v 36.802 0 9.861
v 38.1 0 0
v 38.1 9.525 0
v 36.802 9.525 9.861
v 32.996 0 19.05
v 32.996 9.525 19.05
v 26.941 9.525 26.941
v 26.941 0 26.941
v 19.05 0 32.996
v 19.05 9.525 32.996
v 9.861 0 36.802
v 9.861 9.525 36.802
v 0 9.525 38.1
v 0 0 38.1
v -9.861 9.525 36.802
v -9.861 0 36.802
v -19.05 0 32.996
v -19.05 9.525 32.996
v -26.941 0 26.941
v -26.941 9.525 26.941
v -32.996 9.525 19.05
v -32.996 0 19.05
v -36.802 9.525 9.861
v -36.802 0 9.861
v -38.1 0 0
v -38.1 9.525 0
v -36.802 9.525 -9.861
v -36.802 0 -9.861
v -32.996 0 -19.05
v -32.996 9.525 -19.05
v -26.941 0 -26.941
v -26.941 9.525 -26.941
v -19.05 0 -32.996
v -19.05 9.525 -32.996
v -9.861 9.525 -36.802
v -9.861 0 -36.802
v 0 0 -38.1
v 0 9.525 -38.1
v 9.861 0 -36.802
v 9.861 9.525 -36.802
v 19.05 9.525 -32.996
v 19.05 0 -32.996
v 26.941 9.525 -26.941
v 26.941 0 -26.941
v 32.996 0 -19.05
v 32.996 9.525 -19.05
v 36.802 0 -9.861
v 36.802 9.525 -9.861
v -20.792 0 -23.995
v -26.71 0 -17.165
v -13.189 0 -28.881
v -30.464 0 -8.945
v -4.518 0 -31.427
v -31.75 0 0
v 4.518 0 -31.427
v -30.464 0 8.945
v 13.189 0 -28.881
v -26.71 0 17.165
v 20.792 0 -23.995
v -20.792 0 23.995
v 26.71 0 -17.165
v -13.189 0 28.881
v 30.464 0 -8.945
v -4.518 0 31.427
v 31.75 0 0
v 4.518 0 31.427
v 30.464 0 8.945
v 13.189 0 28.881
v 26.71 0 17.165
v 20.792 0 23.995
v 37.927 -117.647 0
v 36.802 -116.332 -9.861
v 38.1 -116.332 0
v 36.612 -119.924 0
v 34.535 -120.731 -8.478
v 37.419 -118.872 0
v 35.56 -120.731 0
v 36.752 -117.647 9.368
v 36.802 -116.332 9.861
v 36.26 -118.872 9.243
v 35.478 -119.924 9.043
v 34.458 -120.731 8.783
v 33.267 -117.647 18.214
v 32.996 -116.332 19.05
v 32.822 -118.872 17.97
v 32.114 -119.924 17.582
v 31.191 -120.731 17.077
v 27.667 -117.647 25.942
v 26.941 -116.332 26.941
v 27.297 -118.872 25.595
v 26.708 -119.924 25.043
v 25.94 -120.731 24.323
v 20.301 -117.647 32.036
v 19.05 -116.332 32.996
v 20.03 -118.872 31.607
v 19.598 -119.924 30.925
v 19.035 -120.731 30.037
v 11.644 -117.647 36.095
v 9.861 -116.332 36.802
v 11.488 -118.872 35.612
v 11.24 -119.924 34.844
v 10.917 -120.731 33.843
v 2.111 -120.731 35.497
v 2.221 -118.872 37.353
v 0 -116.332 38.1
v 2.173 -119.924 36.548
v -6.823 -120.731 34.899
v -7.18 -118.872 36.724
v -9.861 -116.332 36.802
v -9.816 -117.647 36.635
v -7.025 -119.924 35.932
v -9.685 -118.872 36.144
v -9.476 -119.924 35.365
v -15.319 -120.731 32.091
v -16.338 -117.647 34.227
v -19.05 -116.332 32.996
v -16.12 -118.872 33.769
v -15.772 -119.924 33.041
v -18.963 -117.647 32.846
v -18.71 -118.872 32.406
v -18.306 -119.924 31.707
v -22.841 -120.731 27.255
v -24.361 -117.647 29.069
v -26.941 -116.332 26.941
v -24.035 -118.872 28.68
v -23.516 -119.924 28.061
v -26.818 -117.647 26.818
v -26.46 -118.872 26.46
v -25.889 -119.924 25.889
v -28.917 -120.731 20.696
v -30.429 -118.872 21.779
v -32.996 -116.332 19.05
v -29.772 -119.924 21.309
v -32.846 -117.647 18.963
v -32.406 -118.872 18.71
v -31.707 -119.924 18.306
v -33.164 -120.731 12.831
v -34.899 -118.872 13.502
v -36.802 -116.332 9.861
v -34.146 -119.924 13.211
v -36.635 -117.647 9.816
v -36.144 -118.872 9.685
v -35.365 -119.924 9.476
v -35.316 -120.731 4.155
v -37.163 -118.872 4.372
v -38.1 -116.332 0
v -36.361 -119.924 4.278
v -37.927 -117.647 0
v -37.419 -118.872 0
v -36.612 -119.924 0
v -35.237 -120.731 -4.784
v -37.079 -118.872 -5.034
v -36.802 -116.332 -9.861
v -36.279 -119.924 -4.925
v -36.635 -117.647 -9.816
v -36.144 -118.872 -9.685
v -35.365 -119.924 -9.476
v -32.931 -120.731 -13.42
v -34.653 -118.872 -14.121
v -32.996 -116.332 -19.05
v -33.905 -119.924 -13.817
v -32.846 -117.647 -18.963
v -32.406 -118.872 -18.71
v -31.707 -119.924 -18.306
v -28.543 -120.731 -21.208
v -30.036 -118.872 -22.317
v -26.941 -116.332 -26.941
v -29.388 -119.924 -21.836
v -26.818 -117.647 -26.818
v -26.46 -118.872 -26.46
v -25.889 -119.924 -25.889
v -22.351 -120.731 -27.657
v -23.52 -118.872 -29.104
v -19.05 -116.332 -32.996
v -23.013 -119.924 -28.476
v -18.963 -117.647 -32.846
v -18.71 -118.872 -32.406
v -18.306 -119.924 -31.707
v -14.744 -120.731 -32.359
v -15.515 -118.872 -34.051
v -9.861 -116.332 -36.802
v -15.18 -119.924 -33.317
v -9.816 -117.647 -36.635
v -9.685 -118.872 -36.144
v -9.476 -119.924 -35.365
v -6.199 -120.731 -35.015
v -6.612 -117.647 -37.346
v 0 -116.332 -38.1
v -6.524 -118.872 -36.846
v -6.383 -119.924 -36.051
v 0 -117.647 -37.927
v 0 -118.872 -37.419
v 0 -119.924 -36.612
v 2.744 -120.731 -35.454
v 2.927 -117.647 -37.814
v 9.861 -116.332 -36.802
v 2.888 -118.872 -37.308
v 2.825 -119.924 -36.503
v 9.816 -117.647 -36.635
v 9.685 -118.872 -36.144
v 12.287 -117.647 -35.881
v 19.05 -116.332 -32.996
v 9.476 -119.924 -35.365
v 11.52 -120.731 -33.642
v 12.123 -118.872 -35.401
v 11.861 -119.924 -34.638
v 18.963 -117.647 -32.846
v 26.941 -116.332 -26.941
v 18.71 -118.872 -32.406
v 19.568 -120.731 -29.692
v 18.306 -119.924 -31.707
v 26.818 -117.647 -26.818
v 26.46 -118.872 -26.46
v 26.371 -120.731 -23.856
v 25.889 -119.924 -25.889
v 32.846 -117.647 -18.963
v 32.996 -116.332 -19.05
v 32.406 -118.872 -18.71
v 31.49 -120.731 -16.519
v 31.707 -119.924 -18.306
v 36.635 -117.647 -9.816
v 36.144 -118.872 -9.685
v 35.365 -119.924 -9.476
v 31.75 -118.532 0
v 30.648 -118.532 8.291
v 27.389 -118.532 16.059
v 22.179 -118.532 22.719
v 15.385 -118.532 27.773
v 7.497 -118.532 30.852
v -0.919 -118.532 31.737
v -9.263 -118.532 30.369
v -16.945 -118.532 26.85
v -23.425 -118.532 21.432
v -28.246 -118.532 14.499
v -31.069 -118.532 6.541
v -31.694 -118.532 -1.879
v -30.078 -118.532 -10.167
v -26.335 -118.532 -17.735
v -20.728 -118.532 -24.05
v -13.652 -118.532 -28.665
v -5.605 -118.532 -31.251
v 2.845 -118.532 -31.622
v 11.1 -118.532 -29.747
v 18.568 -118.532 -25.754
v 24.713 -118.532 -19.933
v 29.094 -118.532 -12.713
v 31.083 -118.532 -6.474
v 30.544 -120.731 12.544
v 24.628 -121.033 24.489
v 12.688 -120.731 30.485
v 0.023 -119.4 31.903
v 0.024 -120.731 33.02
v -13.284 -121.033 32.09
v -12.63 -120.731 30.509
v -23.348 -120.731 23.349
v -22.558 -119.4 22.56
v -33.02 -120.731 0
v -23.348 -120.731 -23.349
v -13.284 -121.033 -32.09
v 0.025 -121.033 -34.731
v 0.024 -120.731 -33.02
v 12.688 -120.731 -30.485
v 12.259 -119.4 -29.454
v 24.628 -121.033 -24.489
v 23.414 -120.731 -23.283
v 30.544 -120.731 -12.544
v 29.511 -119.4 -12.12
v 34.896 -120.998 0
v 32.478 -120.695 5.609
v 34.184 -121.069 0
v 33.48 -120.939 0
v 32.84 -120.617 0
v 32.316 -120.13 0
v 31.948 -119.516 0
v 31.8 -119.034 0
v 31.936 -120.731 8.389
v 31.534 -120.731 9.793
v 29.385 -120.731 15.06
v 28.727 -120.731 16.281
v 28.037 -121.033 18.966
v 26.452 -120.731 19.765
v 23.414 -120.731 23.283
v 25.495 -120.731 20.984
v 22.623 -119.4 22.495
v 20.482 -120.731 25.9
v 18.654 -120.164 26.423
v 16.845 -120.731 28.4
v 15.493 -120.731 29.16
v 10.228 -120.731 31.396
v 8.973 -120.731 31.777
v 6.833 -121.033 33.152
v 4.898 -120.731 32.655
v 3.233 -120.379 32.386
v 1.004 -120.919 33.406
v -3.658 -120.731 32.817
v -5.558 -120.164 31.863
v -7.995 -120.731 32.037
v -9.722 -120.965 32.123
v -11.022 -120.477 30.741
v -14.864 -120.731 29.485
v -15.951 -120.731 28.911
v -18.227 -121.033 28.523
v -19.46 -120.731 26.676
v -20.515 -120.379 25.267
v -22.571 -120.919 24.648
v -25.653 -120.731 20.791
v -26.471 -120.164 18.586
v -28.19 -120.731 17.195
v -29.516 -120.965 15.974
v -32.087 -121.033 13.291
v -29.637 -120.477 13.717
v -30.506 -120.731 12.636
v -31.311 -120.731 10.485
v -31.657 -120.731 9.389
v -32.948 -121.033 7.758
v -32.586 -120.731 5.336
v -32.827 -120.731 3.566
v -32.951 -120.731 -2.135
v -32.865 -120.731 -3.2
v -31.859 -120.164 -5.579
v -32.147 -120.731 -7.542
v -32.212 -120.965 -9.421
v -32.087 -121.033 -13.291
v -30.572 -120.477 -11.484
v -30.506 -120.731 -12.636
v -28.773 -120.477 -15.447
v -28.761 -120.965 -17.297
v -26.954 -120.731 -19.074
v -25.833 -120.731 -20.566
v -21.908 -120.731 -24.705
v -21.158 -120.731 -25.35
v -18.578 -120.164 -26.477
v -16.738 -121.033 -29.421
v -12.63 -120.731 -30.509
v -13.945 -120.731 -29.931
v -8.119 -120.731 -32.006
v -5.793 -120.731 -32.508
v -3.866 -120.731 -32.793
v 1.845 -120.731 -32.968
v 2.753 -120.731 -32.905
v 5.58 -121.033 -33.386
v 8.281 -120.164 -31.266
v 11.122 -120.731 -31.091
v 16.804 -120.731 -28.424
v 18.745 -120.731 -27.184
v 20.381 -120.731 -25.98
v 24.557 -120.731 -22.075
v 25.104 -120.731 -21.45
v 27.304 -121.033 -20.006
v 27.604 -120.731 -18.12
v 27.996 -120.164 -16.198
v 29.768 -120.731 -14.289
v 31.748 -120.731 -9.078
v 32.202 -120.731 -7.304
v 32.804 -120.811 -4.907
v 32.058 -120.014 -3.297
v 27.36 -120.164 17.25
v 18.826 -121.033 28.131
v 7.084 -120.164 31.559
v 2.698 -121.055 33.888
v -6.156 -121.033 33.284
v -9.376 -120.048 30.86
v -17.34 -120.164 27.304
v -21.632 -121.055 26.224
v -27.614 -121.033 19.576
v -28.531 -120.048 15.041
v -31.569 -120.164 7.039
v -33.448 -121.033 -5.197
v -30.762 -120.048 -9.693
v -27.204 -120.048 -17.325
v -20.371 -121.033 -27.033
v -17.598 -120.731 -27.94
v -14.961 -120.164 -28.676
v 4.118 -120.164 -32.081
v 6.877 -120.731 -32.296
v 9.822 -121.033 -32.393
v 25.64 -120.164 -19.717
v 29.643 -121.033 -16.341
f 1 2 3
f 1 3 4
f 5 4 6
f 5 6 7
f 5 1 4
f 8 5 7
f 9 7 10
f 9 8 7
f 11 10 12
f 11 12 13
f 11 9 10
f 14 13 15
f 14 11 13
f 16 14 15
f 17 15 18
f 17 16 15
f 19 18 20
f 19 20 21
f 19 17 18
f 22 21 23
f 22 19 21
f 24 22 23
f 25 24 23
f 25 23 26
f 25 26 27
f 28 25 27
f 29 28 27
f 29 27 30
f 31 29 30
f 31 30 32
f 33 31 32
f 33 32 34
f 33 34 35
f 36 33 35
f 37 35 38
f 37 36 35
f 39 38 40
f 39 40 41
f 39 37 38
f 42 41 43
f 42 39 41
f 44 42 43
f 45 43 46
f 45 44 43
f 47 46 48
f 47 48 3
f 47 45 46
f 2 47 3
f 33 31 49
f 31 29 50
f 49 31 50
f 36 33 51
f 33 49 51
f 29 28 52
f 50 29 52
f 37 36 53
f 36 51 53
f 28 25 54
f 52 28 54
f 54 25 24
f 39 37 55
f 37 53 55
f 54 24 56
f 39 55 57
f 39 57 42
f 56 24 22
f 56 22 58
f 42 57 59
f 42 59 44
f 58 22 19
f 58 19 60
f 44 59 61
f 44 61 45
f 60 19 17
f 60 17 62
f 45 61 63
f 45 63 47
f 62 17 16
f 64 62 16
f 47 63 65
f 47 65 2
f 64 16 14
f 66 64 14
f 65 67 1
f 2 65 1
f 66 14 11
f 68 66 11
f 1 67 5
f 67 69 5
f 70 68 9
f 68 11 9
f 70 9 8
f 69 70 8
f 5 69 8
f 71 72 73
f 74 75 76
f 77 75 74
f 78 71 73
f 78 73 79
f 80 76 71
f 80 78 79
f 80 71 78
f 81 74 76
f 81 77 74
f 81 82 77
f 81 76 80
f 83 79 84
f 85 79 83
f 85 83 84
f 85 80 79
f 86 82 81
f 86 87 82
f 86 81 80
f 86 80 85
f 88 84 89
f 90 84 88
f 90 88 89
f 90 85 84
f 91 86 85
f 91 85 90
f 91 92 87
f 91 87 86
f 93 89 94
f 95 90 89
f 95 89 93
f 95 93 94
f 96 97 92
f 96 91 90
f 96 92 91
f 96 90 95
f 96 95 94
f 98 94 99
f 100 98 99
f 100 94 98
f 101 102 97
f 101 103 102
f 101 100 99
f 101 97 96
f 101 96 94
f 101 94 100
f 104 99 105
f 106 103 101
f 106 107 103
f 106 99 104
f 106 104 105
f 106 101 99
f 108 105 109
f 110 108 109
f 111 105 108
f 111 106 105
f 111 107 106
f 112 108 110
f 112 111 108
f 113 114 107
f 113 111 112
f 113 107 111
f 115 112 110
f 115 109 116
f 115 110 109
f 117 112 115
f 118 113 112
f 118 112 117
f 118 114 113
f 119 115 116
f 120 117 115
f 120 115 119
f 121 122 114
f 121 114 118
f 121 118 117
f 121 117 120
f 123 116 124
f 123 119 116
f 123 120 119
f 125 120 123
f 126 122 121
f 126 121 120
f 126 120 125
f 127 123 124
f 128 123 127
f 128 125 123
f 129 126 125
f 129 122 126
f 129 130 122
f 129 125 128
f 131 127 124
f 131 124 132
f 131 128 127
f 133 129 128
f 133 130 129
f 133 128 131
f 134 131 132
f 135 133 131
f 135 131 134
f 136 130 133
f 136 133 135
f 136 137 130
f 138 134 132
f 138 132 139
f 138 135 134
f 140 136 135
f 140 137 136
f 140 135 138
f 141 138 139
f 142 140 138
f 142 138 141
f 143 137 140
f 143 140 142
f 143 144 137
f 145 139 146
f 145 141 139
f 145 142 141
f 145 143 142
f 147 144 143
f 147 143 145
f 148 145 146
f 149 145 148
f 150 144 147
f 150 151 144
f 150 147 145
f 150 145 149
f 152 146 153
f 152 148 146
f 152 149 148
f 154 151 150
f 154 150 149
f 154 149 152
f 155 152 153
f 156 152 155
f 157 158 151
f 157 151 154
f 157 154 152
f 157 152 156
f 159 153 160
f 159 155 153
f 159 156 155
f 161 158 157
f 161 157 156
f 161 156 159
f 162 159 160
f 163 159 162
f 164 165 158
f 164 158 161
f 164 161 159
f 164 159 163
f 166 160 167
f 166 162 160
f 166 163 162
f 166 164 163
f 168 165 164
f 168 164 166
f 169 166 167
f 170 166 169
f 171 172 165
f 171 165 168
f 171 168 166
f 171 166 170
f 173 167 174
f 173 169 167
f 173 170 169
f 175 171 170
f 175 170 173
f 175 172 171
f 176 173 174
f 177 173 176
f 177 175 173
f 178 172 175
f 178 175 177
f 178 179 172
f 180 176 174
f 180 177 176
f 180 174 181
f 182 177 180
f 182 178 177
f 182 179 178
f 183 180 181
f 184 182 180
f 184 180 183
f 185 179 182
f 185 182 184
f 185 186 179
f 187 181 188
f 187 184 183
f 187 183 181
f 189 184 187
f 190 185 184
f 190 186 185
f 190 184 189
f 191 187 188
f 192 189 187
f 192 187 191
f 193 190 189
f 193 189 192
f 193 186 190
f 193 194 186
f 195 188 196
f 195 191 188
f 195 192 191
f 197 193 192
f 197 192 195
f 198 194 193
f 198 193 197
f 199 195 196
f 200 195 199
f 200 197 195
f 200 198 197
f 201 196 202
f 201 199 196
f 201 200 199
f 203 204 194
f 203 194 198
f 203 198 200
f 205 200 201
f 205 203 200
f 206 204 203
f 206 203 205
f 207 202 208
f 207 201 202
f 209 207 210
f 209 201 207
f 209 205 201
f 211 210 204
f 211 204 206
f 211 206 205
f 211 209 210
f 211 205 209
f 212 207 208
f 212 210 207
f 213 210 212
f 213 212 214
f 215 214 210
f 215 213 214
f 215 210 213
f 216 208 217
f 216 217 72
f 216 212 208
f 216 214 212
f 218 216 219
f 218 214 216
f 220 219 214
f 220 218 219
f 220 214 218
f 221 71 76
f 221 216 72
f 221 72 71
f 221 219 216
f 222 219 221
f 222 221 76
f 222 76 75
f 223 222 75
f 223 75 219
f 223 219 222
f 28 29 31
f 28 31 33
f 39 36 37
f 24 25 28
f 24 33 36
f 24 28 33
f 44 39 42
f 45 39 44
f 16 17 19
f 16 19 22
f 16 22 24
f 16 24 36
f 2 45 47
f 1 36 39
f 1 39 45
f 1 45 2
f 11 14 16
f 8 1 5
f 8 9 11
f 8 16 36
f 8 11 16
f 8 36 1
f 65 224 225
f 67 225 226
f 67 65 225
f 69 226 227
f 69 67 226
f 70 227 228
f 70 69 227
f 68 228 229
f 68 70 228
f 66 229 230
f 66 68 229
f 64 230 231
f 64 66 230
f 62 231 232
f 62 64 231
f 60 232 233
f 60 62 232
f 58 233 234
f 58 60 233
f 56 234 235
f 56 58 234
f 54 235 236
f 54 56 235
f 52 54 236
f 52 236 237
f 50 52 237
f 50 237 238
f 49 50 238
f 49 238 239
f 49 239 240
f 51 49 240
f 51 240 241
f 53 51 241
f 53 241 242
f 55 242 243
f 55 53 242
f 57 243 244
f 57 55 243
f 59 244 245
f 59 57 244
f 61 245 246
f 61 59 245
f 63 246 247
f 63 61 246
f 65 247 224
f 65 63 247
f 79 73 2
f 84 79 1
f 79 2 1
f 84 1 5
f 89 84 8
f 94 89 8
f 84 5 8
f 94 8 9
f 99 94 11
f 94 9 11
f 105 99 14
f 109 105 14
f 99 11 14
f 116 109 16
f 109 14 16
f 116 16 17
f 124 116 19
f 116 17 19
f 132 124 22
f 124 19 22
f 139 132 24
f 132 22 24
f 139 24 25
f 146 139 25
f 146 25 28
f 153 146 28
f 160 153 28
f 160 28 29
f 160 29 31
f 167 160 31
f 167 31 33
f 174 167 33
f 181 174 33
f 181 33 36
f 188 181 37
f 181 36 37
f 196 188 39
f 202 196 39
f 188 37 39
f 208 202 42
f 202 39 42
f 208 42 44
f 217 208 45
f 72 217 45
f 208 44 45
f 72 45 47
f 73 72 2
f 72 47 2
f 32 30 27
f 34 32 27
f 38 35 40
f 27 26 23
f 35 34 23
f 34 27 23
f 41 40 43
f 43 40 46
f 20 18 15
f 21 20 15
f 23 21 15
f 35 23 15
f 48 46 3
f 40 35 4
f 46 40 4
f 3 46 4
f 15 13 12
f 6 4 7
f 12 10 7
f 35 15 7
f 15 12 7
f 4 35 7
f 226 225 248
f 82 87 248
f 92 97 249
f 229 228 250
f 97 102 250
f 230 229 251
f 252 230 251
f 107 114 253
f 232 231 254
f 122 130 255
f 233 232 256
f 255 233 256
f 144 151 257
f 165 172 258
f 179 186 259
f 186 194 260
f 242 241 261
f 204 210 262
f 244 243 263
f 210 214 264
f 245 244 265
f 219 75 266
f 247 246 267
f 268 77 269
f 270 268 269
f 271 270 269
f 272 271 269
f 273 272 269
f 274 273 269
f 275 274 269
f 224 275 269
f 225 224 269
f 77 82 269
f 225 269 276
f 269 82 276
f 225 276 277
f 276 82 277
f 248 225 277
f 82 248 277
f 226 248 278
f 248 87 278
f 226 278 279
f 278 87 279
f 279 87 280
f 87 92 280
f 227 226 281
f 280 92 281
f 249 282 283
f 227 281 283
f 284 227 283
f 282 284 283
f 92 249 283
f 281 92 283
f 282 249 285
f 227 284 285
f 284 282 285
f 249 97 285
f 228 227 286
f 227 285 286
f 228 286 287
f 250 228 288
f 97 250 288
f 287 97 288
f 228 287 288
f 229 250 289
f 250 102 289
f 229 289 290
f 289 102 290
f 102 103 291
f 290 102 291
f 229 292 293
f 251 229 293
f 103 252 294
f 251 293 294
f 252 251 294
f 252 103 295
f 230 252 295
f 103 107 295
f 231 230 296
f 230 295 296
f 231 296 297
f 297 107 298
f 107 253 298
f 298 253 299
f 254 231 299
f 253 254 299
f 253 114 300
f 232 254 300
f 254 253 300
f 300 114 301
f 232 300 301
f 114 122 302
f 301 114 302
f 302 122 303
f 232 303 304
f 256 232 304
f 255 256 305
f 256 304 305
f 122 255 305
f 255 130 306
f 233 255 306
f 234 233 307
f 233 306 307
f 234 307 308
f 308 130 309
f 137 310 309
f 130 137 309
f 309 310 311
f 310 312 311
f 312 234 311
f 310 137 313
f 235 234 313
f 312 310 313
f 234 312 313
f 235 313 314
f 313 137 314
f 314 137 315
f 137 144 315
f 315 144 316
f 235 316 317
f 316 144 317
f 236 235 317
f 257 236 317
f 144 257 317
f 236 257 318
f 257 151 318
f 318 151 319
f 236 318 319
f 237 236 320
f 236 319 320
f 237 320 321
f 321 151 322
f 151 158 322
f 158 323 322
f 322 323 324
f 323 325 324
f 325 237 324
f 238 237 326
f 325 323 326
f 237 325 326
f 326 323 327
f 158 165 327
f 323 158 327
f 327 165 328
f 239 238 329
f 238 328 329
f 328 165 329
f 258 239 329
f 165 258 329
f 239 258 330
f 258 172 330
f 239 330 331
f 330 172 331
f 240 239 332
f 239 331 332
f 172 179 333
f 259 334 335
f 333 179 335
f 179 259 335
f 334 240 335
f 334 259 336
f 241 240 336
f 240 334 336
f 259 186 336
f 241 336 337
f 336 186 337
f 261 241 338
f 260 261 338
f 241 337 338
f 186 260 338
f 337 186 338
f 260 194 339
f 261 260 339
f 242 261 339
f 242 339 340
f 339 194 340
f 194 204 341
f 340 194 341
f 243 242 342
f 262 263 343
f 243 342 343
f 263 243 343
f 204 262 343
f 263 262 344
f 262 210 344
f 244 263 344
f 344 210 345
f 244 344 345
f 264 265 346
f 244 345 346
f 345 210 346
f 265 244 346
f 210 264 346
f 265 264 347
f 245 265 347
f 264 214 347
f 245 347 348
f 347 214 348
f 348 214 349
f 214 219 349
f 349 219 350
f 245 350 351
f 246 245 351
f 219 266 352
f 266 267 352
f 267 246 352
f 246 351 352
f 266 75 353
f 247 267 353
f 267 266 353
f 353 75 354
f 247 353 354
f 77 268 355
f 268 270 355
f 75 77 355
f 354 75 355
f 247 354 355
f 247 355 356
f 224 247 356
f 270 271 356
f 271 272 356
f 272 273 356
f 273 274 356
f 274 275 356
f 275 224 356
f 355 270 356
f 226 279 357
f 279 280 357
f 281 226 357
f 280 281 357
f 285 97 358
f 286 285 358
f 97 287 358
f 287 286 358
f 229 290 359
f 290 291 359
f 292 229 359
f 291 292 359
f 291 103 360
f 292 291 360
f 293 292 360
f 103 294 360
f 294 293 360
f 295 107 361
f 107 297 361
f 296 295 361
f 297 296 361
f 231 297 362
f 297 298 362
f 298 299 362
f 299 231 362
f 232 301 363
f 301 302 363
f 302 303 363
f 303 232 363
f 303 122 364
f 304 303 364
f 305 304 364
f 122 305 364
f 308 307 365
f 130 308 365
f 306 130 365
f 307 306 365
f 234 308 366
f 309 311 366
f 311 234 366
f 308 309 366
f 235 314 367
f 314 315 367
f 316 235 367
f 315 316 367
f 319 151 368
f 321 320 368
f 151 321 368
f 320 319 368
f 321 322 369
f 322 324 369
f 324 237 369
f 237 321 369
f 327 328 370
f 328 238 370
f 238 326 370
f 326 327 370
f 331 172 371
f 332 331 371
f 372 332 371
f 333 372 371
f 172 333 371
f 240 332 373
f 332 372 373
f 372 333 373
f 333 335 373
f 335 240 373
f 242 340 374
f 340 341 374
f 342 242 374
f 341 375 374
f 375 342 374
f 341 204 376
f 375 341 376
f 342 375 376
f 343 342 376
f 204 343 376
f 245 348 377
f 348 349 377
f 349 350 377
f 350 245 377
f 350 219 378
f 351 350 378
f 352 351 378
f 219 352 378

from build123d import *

# Parameters (mm, degrees)
F0_R     = 38.1
F0_R_2   = 31.75
F1_DEPTH = 121.412
F2_R     = 5.08
F3_R     = 2.54
F4_DEPTH = 9.525


with BuildPart() as f1:
    # F0 (on Front) → F1 (new body)
    with BuildSketch(Plane.XZ):
        Circle(F0_R)
        Circle(F0_R_2, mode=Mode.SUBTRACT)
    extrude(amount=F1_DEPTH)

    # F2
    f2_edges = [f1.edges().sort_by_distance(p)[0] for p in [
        (-38.1, -121.412, 0),
    ]]
    fillet(f2_edges, radius=F2_R)

    # F3
    f3_edges = [f1.edges().sort_by_distance(p)[0] for p in [
        (-31.75, -121.412, 0),
    ]]
    fillet(f3_edges, radius=F3_R)


with BuildPart() as f4:
    # F0 (on Front) → F4 (new body)
    with BuildSketch(Plane.XZ):
        Circle(F0_R)
        Circle(F0_R_2, mode=Mode.SUBTRACT)
        Circle(F0_R_2)
    extrude(amount=-F4_DEPTH)


solid = Compound([f1.part, f4.part])
